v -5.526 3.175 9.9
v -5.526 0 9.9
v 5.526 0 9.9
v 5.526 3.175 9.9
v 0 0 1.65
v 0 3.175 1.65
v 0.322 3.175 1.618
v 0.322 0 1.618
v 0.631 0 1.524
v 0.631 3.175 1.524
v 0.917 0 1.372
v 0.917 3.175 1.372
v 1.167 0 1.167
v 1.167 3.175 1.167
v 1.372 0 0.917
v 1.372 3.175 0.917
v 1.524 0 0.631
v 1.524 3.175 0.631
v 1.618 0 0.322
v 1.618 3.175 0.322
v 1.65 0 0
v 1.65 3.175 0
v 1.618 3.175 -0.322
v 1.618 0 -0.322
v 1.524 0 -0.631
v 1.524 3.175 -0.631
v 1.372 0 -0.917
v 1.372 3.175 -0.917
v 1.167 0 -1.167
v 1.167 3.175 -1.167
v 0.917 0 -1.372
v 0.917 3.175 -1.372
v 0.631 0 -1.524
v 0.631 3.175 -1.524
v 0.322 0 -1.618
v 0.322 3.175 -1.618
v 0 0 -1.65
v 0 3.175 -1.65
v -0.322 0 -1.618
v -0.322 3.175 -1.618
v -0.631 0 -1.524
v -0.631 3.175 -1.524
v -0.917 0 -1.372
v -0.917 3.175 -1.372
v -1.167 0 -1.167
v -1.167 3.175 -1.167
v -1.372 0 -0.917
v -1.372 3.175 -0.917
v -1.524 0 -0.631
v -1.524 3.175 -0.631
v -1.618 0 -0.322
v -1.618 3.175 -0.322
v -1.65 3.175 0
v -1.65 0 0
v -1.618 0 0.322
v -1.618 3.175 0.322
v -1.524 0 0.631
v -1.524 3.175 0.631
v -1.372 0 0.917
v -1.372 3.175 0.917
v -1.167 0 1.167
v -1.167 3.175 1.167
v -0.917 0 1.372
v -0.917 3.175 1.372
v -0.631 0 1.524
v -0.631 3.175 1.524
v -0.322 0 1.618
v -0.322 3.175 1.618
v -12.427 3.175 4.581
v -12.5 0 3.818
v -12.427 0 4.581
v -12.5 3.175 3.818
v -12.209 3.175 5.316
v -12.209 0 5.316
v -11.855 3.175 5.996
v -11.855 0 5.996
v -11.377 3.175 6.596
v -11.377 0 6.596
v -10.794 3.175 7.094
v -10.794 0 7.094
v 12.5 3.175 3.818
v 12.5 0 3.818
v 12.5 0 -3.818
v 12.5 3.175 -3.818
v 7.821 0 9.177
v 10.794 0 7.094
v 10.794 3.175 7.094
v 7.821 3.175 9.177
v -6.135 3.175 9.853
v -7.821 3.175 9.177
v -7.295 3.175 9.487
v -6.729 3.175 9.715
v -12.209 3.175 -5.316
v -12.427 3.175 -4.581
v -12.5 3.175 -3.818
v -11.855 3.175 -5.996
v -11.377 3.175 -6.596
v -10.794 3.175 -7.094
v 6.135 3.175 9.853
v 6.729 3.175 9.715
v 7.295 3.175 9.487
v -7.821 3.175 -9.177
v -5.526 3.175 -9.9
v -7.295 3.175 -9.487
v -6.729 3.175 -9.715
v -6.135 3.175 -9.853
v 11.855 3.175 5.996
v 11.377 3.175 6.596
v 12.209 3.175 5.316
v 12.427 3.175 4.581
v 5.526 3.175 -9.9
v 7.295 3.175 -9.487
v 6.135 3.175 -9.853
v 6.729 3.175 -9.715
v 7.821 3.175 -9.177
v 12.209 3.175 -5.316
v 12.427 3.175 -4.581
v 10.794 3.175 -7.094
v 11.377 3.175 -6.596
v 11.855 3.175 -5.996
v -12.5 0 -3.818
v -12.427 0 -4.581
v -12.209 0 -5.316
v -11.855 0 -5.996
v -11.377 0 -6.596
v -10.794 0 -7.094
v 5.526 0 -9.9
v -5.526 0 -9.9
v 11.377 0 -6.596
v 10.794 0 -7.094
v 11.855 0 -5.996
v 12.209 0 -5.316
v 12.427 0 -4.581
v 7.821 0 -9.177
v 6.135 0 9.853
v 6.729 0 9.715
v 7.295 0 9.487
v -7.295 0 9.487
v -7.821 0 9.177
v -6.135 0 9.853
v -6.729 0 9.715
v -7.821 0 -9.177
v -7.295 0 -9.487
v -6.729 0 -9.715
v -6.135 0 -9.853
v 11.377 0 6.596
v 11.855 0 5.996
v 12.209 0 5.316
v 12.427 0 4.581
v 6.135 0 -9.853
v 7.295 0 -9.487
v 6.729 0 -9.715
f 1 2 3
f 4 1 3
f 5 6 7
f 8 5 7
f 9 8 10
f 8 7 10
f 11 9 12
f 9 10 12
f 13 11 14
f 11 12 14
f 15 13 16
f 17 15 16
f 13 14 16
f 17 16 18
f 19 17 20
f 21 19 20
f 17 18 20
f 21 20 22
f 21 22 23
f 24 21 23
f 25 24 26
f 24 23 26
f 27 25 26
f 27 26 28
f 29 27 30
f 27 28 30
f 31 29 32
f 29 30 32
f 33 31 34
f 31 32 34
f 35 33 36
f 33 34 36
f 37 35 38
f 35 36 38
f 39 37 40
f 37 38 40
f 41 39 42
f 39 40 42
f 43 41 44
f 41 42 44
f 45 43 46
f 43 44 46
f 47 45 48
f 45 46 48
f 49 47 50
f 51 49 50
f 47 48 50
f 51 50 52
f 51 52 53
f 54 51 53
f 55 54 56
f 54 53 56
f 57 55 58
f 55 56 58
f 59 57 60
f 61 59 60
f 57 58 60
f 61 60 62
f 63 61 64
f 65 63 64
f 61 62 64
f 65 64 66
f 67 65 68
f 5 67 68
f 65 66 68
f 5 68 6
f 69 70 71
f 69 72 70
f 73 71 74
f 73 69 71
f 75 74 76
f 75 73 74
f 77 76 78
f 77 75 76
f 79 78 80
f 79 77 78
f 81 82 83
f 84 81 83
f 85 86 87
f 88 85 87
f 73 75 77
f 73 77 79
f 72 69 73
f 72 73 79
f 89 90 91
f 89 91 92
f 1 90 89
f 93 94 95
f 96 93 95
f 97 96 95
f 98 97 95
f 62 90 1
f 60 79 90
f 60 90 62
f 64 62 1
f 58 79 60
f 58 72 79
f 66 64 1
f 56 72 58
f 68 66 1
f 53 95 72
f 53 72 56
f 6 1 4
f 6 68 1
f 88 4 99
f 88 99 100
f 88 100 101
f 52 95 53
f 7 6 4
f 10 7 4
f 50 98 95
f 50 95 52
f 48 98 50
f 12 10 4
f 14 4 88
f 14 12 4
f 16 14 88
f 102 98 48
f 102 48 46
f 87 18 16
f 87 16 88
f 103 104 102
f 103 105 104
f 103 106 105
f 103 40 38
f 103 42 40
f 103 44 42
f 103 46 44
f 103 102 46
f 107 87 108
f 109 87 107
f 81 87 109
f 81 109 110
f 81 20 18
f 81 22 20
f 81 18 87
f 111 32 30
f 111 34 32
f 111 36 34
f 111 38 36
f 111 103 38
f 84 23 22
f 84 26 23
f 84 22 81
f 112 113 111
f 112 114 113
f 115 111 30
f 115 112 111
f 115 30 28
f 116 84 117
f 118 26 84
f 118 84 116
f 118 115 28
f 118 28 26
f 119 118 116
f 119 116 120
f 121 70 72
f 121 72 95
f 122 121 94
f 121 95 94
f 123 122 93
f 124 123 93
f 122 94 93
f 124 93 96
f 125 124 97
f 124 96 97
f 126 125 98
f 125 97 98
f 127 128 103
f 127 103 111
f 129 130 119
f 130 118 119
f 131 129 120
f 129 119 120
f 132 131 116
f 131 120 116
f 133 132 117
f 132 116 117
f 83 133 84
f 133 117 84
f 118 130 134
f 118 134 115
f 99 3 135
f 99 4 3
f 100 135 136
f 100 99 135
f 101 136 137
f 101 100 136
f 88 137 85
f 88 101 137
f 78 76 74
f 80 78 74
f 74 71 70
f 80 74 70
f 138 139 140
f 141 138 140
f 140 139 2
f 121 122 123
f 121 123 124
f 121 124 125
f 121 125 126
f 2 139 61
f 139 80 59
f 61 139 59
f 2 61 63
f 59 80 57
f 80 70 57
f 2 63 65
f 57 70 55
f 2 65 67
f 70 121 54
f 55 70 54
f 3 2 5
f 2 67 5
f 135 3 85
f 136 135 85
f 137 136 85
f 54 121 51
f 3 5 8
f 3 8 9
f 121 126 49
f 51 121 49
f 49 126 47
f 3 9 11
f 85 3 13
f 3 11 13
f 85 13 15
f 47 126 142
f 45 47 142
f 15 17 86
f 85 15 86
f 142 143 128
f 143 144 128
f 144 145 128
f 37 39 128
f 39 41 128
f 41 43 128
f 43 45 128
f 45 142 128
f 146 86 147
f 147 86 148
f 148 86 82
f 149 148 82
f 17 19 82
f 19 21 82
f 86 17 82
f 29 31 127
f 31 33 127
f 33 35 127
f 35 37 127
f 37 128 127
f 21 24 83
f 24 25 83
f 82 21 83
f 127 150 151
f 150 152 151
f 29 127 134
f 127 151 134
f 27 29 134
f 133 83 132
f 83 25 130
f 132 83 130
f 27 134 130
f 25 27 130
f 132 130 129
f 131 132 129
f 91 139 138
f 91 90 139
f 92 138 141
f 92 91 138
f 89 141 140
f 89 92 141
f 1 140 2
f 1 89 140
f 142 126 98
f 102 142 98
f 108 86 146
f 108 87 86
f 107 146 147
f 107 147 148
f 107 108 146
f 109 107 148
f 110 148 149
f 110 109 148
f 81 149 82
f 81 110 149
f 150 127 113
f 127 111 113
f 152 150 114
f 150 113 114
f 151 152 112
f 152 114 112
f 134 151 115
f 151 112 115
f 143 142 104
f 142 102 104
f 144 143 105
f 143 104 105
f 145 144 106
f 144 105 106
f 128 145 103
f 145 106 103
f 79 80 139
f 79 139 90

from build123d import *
from OCP.BRepFilletAPI import BRepFilletAPI_MakeChamfer

# Parameters (mm, degrees)
SKETCH2_W           = 25
SKETCH2_H           = 19.8
BOSS_EXTRUDE2_DEPTH = 3.175
SKETCH3_R           = 1.65
CUT_EXTRUDE1_DEPTH  = 3.175
CHAMFER1_SIZE       = 4
CHAMFER1_SIZE2      = 5.712592027
FILLET2_R           = 4


with BuildPart() as part:
    # Sketch2 → Boss-Extrude2 (new body)
    with BuildSketch(Plane(origin=(0, 0, 0), x_dir=(1, 0, 0), z_dir=(0, 1, 0))):
        Rectangle(SKETCH2_W, SKETCH2_H)
    extrude(amount=BOSS_EXTRUDE2_DEPTH)

    # Sketch3 → Cut-Extrude1 (cut)
    with BuildSketch(Plane(origin=(0, 3.175, 0), x_dir=(1, 0, 0), z_dir=(0, 1, 0))):
        with Locations(Location((0, 0, 0), (0, 0, 270))):
            Circle(SKETCH3_R)
    extrude(amount=-CUT_EXTRUDE1_DEPTH, mode=Mode.SUBTRACT)

    # Chamfer1: one chamfer whose edges measure the first distance from different faces: ONE call of the kernel's chamfer builder (chamfer() names one face for all edges)
    chamfer1_edges_1 = [part.edges().sort_by_distance(p)[0] for p in [
        (12.5, 1.5875, 9.9),
        (12.5, 1.5875, -9.9),
    ]]
    chamfer1_side_1 = [part.faces().sort_by_distance(p)[0] for p in [
        (12.5, 1.5875, 0),
    ]]
    chamfer1_edges_2 = [part.edges().sort_by_distance(p)[0] for p in [
        (-12.5, 1.5875, 9.9),
        (-12.5, 1.5875, -9.9),
    ]]
    chamfer1_side_2 = [part.faces().sort_by_distance(p)[0] for p in [
        (-12.5, 1.5875, 0),
    ]]
    chamfer1 = BRepFilletAPI_MakeChamfer(part.part.solid().wrapped)
    for e in chamfer1_edges_1:
        chamfer1.Add(CHAMFER1_SIZE, CHAMFER1_SIZE2, e.wrapped, chamfer1_side_1[0].wrapped)  # the first distance lies on this face
    for e in chamfer1_edges_2:
        chamfer1.Add(CHAMFER1_SIZE, CHAMFER1_SIZE2, e.wrapped, chamfer1_side_2[0].wrapped)  # the first distance lies on this face
    add(Compound.cast(chamfer1.Shape()), mode=Mode.REPLACE)

    # Fillet2
    fillet2_edges = [part.edges().sort_by_distance(p)[0] for p in [
        (12.5, 1.5875, -5.9),
        (12.5, 1.5875, 5.9),
        (-6.787407973, 1.5875, 9.9),
        (6.787407973, 1.5875, 9.9),
        (-12.5, 1.5875, -5.9),
        (-12.5, 1.5875, 5.9),
        (6.787407973, 1.5875, -9.9),
        (-6.787407973, 1.5875, -9.9),
    ]]
    fillet(fillet2_edges, radius=FILLET2_R)


solid = part.part
